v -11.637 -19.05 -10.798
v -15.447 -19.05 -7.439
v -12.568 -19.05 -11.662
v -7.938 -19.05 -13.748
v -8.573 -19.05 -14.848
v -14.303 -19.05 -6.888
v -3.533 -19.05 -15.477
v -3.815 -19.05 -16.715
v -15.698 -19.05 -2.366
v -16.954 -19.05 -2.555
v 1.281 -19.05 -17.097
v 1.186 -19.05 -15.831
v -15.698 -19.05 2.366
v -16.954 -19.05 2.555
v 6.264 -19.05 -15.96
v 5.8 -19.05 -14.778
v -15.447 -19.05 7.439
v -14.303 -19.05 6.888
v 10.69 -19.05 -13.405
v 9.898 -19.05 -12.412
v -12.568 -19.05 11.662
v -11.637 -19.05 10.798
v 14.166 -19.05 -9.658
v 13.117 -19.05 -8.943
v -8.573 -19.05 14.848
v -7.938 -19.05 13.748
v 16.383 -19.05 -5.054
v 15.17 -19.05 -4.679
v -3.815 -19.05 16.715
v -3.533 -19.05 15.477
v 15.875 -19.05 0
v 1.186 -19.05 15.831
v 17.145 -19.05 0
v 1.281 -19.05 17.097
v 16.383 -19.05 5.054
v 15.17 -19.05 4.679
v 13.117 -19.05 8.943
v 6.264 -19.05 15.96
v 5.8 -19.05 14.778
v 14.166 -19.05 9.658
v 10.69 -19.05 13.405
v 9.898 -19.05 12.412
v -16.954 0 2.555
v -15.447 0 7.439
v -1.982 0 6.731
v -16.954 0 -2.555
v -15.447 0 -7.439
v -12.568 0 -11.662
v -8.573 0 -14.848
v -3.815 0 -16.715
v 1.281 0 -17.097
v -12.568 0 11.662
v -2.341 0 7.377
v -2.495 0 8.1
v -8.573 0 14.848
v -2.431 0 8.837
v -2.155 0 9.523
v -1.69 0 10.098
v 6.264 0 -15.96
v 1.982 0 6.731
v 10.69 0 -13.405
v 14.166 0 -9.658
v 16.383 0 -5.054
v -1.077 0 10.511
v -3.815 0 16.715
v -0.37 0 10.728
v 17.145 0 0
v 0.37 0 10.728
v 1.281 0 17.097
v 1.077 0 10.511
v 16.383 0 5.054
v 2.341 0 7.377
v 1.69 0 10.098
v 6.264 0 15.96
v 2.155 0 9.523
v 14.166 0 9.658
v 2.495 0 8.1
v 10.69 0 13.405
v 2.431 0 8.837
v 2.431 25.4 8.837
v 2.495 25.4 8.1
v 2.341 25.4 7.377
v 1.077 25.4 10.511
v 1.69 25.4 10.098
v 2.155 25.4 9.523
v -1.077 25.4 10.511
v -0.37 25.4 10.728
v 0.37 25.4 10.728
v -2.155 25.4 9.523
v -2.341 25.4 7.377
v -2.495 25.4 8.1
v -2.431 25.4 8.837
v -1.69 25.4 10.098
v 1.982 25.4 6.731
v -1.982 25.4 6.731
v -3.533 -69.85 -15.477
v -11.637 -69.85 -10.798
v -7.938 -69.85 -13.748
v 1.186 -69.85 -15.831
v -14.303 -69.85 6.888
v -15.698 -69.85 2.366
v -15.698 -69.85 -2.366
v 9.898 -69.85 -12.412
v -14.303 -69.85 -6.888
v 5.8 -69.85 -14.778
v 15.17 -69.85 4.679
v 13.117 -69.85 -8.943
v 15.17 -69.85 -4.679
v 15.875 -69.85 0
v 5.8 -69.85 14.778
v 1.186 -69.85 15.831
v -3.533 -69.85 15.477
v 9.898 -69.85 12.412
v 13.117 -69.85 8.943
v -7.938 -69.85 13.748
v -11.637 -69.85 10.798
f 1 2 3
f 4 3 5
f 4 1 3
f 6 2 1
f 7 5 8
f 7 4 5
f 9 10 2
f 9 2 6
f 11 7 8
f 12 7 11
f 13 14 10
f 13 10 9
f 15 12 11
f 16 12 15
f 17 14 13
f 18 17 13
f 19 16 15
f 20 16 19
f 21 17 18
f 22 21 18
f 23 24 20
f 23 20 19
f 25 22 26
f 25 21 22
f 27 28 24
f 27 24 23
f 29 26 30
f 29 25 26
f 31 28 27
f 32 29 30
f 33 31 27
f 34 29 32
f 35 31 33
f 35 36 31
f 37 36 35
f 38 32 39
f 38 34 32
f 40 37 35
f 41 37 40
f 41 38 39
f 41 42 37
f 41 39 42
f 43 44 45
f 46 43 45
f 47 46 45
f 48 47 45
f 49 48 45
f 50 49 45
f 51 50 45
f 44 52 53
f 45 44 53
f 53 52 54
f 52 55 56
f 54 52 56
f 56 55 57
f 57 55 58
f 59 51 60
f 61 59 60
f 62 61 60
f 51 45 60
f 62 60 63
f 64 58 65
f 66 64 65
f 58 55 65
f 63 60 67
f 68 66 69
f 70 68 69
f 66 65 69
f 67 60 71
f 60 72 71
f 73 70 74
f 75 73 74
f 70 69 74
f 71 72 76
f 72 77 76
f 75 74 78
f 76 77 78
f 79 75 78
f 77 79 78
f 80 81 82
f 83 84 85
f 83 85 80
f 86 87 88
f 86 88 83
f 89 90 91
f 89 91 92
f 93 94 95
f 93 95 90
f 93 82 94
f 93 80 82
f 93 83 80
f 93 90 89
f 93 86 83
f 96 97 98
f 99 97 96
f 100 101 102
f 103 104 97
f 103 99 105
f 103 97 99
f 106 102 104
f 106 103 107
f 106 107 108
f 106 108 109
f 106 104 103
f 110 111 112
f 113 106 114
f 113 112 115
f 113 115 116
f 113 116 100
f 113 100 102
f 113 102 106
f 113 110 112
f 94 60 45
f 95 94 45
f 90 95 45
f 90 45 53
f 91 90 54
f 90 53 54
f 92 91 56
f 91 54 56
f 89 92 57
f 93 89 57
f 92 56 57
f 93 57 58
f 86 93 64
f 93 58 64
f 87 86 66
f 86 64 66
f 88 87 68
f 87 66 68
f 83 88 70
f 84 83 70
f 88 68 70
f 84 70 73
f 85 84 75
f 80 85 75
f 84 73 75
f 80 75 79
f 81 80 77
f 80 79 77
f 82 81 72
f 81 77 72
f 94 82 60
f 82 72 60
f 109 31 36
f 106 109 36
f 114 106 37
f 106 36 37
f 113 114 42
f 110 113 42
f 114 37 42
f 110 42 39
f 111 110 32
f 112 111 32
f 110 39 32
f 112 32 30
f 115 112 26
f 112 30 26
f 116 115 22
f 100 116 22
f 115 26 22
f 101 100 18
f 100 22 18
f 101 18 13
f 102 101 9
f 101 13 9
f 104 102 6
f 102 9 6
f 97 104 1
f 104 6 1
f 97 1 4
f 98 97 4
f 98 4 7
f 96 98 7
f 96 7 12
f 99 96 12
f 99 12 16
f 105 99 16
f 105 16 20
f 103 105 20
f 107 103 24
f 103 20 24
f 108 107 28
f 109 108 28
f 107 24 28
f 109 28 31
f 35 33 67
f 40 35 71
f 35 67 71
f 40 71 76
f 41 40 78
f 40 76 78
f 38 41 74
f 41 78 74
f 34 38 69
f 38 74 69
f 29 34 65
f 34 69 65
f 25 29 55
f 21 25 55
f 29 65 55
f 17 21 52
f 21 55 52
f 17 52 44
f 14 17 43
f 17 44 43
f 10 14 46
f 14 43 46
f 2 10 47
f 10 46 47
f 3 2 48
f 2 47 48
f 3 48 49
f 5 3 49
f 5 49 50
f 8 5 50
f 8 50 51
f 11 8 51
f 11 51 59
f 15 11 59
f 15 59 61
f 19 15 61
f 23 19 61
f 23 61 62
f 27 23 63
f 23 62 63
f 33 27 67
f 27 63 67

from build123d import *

# Parameters (mm, degrees)
F0_R     = 17.145
F1_DEPTH = 19.05
F3_DEPTH = 25.4
F4_R     = 15.875
F5_DEPTH = 50.8


with BuildPart() as f1:
    # F0 (on Front) → F1 (new body)
    with BuildSketch(Plane.XZ):
        Circle(F0_R)
    extrude(amount=F1_DEPTH)

    # F2 (on face) → F3 (join)
    with BuildSketch(Plane(origin=(0, 0, 0), x_dir=(-1, 0, 0), z_dir=(0, 1, 0))):
        with BuildLine():
            Line((-1.981773, 6.731), (1.981773, 6.731))
            ThreePointArc((1.981773, 6.731), (0, 10.755), (-1.981773, 6.731))
        make_face()
    extrude(amount=F3_DEPTH)

    # F4 (on face) → F5 (join)
    with BuildSketch(Plane.XZ.offset(19.05)):
        Circle(F4_R)
    extrude(amount=F5_DEPTH)


solid = f1.part
